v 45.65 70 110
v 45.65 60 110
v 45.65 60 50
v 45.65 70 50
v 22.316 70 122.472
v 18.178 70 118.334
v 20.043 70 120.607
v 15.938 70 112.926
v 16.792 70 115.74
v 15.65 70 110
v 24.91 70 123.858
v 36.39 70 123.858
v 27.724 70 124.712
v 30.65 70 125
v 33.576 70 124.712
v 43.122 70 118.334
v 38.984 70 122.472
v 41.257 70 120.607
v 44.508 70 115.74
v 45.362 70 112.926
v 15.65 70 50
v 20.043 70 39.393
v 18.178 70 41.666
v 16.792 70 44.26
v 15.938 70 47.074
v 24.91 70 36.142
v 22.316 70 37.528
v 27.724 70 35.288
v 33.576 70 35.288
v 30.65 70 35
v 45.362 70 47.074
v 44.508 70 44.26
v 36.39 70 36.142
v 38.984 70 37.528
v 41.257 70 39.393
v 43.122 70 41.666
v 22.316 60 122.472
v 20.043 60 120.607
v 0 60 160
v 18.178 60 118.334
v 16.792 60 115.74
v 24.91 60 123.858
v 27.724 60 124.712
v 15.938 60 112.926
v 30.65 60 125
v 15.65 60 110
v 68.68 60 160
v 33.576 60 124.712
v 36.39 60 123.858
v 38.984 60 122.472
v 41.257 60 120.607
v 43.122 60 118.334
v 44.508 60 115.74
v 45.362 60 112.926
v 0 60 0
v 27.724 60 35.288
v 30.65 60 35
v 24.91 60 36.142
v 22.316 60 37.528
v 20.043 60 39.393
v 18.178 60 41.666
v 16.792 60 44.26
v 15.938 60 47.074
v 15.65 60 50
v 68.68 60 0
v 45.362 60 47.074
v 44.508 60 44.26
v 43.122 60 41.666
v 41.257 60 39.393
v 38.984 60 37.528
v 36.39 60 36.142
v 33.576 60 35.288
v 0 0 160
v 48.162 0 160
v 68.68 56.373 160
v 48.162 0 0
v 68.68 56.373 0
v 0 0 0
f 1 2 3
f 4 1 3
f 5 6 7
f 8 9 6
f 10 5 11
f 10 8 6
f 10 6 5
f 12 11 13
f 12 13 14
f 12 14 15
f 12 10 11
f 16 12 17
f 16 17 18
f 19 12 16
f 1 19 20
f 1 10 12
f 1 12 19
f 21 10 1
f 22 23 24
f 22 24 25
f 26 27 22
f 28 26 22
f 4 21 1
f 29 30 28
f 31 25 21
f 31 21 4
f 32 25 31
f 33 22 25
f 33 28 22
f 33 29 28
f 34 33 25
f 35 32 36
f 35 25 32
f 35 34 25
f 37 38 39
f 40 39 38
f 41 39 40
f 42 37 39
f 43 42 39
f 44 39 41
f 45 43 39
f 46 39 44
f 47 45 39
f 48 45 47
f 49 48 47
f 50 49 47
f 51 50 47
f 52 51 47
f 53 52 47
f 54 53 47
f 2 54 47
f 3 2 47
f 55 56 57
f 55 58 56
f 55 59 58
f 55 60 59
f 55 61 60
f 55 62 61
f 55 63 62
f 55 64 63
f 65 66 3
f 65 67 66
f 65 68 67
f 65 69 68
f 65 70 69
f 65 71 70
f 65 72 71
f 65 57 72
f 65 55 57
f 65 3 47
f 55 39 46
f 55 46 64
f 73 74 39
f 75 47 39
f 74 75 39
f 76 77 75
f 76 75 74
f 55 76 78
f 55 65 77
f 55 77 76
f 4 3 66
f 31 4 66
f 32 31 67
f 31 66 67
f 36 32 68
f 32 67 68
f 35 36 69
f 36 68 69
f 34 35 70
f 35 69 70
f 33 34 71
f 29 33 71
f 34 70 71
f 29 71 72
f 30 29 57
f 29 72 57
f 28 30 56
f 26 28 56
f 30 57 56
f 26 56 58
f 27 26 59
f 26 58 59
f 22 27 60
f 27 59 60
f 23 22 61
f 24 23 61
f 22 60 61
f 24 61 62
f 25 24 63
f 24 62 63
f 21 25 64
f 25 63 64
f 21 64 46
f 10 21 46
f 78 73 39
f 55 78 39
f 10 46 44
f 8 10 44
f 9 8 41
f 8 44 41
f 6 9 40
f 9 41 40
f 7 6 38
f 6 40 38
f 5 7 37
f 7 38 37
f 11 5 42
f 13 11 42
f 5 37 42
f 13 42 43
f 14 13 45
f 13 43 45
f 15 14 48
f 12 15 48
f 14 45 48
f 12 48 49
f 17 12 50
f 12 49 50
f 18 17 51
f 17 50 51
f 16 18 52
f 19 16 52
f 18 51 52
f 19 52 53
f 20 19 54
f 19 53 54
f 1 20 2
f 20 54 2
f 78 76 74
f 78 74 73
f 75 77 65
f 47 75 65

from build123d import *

# Parameters (mm, degrees)
BOSS_EXTRUDE1_DEPTH = 160
BOSS_EXTRUDE2_START = 60
BOSS_EXTRUDE2_DEPTH = 10
SKETCH4_W           = 2.23742312
SKETCH4_H           = 10.231207741
CUT_EXTRUDE1_DEPTH  = 175


# Read off the part's stored shape, not the designer's step: Boss-Extrude2
with BuildPart() as part:
    # Sketch1 → Boss-Extrude1 (new body)
    with BuildSketch(Plane.XY):
        Polygon((0, 0), (0, 60), (70, 60), (48.161785944, 0), align=None)
    extrude(amount=BOSS_EXTRUDE1_DEPTH)

    # Boss-Extrude2 outline → Boss-Extrude2 (add)
    with BuildSketch(Plane(origin=(0, 0, 0), x_dir=(1, 0, 0), z_dir=(0, 1, 0)).offset(BOSS_EXTRUDE2_START)):
        with BuildLine():
            ThreePointArc((45.65, -50), (30.65, -35), (15.65, -50))
            Line((15.65, -50), (15.65, -110))
            ThreePointArc((15.65, -110), (30.65, -125), (45.65, -110))
            Line((45.65, -110), (45.65, -50))
        make_face()
    extrude(amount=BOSS_EXTRUDE2_DEPTH)

    # Sketch4 → Cut-Extrude1 (cut)
    with BuildSketch(Plane.XY.offset(160)):
        with Locations((69.79871156, 58.529652548)):
            Rectangle(SKETCH4_W, SKETCH4_H)
    extrude(amount=-CUT_EXTRUDE1_DEPTH, mode=Mode.SUBTRACT)


solid = part.part
